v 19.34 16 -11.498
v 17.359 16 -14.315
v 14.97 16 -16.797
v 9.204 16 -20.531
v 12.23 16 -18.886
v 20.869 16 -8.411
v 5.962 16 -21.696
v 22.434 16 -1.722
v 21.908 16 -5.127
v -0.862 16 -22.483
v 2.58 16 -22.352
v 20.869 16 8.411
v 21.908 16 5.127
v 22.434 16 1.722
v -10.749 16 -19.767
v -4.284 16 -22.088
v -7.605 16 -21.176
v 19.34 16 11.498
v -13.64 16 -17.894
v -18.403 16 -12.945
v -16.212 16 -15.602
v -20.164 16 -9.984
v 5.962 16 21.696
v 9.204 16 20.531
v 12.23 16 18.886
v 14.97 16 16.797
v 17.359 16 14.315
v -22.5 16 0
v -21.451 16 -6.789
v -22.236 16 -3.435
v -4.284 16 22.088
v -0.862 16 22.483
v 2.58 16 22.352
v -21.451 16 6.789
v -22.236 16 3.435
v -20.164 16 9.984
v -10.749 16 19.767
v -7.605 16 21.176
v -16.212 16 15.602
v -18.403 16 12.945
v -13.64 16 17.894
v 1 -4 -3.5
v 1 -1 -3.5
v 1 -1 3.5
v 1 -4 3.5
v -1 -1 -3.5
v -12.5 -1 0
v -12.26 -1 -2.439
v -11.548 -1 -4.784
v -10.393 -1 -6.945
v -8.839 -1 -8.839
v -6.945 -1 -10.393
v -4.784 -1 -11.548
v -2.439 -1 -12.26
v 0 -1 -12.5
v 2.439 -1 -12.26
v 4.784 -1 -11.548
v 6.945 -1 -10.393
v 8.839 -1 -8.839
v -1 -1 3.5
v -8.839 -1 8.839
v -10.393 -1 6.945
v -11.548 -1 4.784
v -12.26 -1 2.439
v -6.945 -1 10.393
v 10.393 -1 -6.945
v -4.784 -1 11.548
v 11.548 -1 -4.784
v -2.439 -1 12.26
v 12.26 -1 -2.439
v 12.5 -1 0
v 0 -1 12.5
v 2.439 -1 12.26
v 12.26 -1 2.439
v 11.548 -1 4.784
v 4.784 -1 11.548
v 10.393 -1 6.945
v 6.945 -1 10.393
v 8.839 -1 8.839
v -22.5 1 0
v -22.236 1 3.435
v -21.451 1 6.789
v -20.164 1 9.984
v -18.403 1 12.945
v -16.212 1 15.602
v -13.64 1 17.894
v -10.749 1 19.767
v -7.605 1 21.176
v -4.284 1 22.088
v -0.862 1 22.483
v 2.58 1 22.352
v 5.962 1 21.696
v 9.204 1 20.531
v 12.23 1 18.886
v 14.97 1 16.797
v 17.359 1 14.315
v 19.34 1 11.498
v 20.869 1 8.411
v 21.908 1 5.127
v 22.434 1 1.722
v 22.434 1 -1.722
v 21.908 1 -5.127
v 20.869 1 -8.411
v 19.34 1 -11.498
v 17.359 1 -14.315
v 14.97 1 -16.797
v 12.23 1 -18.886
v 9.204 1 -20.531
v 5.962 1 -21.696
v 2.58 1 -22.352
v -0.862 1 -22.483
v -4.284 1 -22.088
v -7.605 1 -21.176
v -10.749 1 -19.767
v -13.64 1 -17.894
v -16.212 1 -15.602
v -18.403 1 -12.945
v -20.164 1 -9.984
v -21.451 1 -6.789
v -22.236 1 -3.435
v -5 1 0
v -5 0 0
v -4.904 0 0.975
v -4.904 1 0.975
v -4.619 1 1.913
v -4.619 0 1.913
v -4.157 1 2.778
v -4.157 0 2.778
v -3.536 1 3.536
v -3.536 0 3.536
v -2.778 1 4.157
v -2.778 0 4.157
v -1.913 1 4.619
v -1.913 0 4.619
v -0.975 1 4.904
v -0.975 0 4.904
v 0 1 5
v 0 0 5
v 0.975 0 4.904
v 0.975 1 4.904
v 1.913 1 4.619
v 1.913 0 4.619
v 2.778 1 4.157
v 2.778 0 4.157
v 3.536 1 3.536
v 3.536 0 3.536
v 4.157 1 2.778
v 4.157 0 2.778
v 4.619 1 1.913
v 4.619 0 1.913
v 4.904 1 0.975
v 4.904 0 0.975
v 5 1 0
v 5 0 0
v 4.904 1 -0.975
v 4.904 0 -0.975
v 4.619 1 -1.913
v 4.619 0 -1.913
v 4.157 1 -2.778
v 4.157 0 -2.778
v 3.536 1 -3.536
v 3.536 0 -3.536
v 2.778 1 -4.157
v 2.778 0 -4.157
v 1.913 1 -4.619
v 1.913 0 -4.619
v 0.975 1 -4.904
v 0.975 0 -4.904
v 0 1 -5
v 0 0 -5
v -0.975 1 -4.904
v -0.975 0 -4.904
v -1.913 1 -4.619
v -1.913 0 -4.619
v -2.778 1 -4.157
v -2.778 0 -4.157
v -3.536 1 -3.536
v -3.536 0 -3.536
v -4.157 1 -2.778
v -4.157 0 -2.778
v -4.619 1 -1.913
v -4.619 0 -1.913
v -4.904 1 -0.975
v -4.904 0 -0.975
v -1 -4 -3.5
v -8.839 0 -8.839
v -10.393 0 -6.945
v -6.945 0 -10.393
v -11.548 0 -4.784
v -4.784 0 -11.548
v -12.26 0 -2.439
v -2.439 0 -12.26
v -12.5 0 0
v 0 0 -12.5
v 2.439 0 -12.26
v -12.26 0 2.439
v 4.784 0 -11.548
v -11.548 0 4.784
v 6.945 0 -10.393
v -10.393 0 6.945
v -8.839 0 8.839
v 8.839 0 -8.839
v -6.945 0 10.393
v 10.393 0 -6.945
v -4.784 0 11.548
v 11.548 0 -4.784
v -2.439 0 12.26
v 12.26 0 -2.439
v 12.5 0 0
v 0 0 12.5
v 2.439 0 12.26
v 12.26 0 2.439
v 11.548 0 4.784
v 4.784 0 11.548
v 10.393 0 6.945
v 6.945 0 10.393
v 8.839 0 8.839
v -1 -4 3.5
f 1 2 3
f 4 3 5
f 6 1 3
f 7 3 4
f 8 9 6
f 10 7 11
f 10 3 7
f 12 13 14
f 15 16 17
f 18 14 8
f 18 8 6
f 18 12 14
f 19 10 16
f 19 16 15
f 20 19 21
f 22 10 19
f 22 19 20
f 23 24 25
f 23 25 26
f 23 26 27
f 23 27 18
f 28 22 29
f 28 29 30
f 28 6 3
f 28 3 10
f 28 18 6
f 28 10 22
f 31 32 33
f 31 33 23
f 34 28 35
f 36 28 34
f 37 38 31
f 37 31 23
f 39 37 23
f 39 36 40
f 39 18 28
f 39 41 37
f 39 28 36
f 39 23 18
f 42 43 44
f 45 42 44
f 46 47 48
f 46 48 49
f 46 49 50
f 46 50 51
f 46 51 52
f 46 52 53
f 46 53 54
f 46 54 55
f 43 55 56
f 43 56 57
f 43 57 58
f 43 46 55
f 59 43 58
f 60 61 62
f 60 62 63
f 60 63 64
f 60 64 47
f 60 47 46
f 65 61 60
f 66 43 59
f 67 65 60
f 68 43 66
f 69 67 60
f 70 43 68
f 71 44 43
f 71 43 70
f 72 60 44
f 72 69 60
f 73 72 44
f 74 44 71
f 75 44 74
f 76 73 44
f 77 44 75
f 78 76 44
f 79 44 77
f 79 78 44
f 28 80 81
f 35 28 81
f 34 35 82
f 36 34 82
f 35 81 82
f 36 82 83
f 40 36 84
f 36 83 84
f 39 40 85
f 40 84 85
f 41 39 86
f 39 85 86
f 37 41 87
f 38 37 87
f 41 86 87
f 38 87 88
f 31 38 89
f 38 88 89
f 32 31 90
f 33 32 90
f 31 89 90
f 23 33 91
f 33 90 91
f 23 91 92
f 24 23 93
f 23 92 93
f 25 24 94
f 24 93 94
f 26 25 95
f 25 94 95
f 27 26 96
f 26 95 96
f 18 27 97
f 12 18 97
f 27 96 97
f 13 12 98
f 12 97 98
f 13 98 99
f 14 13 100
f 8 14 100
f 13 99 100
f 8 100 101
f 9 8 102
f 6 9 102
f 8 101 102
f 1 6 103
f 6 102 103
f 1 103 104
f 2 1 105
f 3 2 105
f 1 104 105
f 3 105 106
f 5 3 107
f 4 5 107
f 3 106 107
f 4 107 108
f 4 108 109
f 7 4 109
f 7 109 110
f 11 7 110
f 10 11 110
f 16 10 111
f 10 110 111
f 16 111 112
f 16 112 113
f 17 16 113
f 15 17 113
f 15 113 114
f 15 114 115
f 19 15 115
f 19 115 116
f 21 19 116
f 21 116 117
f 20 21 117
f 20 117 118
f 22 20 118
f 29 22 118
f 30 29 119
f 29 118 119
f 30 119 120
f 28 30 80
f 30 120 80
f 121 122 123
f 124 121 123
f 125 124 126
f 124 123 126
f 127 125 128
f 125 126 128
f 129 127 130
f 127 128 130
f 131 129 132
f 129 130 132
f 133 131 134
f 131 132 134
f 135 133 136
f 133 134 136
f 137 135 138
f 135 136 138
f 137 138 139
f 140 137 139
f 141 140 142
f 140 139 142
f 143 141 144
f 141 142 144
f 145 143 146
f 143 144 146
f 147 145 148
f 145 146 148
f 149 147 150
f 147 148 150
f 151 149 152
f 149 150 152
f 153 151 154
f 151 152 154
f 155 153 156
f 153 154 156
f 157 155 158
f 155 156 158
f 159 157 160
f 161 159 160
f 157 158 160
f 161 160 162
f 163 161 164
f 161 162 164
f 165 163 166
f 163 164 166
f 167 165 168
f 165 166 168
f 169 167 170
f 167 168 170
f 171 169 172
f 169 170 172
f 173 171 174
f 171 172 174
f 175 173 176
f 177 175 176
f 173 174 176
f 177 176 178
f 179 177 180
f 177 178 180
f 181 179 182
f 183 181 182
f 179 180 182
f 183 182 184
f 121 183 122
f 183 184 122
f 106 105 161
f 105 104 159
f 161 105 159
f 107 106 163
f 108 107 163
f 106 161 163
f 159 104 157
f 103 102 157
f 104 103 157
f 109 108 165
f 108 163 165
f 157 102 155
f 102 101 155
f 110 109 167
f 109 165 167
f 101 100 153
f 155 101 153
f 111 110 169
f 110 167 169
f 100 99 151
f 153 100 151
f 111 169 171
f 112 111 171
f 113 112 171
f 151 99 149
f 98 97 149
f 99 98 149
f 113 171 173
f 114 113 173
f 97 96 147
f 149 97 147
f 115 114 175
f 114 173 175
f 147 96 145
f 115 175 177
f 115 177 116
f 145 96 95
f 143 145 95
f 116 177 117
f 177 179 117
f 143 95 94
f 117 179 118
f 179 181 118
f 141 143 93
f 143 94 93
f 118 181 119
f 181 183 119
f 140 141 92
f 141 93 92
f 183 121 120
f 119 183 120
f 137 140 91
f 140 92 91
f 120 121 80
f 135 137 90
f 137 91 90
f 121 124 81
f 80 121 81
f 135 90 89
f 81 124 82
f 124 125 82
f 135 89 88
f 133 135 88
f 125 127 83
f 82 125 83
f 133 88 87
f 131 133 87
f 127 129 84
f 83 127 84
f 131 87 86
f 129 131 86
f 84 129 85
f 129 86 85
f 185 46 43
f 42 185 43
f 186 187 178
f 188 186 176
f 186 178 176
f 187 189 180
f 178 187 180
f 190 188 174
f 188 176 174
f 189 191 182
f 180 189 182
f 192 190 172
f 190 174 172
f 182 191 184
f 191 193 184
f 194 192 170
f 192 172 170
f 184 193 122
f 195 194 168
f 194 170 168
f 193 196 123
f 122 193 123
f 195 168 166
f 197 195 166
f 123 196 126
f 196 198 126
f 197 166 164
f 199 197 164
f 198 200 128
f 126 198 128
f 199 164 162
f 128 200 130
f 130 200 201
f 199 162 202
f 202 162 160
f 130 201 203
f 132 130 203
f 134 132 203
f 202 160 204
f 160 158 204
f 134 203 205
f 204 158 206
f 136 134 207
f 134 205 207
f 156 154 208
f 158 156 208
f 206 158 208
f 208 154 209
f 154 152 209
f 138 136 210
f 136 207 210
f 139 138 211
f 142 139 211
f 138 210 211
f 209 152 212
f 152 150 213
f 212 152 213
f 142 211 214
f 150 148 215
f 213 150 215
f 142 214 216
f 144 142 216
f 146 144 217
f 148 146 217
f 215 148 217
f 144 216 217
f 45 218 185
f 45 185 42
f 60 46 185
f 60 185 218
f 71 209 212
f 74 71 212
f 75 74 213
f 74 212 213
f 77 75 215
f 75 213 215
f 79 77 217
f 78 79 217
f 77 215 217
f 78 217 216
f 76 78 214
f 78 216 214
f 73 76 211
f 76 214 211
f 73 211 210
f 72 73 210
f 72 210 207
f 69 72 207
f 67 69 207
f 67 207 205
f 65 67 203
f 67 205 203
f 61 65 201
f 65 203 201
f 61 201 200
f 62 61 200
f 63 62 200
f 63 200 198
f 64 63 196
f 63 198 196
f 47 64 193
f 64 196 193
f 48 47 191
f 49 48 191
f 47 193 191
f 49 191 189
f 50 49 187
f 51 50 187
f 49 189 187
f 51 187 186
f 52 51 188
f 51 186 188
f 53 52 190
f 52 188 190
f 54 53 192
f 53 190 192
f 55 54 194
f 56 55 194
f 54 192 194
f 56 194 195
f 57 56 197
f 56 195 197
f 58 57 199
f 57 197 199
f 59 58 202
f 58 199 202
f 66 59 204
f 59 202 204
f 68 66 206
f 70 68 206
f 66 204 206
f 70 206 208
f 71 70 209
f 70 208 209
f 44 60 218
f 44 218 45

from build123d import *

# Parameters (mm, degrees)
F0_R     = 12.5
F1_DEPTH = 1
F2_W     = 2
F2_H     = 7
F3_DEPTH = 3
F4_R     = 5
F5_DEPTH = 1
F6_R     = 22.5
F7_DEPTH = 15


with BuildPart() as f1:
    # F0 (on Front) → F1 (new body)
    with BuildSketch(Plane.XZ):
        Circle(F0_R)
    extrude(amount=F1_DEPTH)

    # F2 (on face) → F3 (join)
    with BuildSketch(Plane.XZ.offset(1)):
        Rectangle(F2_W, F2_H)
    extrude(amount=F3_DEPTH)

    # F4 (on face) → F5 (join)
    with BuildSketch(Plane(origin=(0, 0, 0), x_dir=(-1, 0, 0), z_dir=(0, 1, 0))):
        Circle(F4_R)
    extrude(amount=F5_DEPTH)

    # F6 (on face) → F7 (join)
    with BuildSketch(Plane(origin=(0, 1, 0), x_dir=(-1, 0, 0), z_dir=(0, 1, 0))):
        Circle(F6_R)
    extrude(amount=F7_DEPTH)


solid = f1.part
